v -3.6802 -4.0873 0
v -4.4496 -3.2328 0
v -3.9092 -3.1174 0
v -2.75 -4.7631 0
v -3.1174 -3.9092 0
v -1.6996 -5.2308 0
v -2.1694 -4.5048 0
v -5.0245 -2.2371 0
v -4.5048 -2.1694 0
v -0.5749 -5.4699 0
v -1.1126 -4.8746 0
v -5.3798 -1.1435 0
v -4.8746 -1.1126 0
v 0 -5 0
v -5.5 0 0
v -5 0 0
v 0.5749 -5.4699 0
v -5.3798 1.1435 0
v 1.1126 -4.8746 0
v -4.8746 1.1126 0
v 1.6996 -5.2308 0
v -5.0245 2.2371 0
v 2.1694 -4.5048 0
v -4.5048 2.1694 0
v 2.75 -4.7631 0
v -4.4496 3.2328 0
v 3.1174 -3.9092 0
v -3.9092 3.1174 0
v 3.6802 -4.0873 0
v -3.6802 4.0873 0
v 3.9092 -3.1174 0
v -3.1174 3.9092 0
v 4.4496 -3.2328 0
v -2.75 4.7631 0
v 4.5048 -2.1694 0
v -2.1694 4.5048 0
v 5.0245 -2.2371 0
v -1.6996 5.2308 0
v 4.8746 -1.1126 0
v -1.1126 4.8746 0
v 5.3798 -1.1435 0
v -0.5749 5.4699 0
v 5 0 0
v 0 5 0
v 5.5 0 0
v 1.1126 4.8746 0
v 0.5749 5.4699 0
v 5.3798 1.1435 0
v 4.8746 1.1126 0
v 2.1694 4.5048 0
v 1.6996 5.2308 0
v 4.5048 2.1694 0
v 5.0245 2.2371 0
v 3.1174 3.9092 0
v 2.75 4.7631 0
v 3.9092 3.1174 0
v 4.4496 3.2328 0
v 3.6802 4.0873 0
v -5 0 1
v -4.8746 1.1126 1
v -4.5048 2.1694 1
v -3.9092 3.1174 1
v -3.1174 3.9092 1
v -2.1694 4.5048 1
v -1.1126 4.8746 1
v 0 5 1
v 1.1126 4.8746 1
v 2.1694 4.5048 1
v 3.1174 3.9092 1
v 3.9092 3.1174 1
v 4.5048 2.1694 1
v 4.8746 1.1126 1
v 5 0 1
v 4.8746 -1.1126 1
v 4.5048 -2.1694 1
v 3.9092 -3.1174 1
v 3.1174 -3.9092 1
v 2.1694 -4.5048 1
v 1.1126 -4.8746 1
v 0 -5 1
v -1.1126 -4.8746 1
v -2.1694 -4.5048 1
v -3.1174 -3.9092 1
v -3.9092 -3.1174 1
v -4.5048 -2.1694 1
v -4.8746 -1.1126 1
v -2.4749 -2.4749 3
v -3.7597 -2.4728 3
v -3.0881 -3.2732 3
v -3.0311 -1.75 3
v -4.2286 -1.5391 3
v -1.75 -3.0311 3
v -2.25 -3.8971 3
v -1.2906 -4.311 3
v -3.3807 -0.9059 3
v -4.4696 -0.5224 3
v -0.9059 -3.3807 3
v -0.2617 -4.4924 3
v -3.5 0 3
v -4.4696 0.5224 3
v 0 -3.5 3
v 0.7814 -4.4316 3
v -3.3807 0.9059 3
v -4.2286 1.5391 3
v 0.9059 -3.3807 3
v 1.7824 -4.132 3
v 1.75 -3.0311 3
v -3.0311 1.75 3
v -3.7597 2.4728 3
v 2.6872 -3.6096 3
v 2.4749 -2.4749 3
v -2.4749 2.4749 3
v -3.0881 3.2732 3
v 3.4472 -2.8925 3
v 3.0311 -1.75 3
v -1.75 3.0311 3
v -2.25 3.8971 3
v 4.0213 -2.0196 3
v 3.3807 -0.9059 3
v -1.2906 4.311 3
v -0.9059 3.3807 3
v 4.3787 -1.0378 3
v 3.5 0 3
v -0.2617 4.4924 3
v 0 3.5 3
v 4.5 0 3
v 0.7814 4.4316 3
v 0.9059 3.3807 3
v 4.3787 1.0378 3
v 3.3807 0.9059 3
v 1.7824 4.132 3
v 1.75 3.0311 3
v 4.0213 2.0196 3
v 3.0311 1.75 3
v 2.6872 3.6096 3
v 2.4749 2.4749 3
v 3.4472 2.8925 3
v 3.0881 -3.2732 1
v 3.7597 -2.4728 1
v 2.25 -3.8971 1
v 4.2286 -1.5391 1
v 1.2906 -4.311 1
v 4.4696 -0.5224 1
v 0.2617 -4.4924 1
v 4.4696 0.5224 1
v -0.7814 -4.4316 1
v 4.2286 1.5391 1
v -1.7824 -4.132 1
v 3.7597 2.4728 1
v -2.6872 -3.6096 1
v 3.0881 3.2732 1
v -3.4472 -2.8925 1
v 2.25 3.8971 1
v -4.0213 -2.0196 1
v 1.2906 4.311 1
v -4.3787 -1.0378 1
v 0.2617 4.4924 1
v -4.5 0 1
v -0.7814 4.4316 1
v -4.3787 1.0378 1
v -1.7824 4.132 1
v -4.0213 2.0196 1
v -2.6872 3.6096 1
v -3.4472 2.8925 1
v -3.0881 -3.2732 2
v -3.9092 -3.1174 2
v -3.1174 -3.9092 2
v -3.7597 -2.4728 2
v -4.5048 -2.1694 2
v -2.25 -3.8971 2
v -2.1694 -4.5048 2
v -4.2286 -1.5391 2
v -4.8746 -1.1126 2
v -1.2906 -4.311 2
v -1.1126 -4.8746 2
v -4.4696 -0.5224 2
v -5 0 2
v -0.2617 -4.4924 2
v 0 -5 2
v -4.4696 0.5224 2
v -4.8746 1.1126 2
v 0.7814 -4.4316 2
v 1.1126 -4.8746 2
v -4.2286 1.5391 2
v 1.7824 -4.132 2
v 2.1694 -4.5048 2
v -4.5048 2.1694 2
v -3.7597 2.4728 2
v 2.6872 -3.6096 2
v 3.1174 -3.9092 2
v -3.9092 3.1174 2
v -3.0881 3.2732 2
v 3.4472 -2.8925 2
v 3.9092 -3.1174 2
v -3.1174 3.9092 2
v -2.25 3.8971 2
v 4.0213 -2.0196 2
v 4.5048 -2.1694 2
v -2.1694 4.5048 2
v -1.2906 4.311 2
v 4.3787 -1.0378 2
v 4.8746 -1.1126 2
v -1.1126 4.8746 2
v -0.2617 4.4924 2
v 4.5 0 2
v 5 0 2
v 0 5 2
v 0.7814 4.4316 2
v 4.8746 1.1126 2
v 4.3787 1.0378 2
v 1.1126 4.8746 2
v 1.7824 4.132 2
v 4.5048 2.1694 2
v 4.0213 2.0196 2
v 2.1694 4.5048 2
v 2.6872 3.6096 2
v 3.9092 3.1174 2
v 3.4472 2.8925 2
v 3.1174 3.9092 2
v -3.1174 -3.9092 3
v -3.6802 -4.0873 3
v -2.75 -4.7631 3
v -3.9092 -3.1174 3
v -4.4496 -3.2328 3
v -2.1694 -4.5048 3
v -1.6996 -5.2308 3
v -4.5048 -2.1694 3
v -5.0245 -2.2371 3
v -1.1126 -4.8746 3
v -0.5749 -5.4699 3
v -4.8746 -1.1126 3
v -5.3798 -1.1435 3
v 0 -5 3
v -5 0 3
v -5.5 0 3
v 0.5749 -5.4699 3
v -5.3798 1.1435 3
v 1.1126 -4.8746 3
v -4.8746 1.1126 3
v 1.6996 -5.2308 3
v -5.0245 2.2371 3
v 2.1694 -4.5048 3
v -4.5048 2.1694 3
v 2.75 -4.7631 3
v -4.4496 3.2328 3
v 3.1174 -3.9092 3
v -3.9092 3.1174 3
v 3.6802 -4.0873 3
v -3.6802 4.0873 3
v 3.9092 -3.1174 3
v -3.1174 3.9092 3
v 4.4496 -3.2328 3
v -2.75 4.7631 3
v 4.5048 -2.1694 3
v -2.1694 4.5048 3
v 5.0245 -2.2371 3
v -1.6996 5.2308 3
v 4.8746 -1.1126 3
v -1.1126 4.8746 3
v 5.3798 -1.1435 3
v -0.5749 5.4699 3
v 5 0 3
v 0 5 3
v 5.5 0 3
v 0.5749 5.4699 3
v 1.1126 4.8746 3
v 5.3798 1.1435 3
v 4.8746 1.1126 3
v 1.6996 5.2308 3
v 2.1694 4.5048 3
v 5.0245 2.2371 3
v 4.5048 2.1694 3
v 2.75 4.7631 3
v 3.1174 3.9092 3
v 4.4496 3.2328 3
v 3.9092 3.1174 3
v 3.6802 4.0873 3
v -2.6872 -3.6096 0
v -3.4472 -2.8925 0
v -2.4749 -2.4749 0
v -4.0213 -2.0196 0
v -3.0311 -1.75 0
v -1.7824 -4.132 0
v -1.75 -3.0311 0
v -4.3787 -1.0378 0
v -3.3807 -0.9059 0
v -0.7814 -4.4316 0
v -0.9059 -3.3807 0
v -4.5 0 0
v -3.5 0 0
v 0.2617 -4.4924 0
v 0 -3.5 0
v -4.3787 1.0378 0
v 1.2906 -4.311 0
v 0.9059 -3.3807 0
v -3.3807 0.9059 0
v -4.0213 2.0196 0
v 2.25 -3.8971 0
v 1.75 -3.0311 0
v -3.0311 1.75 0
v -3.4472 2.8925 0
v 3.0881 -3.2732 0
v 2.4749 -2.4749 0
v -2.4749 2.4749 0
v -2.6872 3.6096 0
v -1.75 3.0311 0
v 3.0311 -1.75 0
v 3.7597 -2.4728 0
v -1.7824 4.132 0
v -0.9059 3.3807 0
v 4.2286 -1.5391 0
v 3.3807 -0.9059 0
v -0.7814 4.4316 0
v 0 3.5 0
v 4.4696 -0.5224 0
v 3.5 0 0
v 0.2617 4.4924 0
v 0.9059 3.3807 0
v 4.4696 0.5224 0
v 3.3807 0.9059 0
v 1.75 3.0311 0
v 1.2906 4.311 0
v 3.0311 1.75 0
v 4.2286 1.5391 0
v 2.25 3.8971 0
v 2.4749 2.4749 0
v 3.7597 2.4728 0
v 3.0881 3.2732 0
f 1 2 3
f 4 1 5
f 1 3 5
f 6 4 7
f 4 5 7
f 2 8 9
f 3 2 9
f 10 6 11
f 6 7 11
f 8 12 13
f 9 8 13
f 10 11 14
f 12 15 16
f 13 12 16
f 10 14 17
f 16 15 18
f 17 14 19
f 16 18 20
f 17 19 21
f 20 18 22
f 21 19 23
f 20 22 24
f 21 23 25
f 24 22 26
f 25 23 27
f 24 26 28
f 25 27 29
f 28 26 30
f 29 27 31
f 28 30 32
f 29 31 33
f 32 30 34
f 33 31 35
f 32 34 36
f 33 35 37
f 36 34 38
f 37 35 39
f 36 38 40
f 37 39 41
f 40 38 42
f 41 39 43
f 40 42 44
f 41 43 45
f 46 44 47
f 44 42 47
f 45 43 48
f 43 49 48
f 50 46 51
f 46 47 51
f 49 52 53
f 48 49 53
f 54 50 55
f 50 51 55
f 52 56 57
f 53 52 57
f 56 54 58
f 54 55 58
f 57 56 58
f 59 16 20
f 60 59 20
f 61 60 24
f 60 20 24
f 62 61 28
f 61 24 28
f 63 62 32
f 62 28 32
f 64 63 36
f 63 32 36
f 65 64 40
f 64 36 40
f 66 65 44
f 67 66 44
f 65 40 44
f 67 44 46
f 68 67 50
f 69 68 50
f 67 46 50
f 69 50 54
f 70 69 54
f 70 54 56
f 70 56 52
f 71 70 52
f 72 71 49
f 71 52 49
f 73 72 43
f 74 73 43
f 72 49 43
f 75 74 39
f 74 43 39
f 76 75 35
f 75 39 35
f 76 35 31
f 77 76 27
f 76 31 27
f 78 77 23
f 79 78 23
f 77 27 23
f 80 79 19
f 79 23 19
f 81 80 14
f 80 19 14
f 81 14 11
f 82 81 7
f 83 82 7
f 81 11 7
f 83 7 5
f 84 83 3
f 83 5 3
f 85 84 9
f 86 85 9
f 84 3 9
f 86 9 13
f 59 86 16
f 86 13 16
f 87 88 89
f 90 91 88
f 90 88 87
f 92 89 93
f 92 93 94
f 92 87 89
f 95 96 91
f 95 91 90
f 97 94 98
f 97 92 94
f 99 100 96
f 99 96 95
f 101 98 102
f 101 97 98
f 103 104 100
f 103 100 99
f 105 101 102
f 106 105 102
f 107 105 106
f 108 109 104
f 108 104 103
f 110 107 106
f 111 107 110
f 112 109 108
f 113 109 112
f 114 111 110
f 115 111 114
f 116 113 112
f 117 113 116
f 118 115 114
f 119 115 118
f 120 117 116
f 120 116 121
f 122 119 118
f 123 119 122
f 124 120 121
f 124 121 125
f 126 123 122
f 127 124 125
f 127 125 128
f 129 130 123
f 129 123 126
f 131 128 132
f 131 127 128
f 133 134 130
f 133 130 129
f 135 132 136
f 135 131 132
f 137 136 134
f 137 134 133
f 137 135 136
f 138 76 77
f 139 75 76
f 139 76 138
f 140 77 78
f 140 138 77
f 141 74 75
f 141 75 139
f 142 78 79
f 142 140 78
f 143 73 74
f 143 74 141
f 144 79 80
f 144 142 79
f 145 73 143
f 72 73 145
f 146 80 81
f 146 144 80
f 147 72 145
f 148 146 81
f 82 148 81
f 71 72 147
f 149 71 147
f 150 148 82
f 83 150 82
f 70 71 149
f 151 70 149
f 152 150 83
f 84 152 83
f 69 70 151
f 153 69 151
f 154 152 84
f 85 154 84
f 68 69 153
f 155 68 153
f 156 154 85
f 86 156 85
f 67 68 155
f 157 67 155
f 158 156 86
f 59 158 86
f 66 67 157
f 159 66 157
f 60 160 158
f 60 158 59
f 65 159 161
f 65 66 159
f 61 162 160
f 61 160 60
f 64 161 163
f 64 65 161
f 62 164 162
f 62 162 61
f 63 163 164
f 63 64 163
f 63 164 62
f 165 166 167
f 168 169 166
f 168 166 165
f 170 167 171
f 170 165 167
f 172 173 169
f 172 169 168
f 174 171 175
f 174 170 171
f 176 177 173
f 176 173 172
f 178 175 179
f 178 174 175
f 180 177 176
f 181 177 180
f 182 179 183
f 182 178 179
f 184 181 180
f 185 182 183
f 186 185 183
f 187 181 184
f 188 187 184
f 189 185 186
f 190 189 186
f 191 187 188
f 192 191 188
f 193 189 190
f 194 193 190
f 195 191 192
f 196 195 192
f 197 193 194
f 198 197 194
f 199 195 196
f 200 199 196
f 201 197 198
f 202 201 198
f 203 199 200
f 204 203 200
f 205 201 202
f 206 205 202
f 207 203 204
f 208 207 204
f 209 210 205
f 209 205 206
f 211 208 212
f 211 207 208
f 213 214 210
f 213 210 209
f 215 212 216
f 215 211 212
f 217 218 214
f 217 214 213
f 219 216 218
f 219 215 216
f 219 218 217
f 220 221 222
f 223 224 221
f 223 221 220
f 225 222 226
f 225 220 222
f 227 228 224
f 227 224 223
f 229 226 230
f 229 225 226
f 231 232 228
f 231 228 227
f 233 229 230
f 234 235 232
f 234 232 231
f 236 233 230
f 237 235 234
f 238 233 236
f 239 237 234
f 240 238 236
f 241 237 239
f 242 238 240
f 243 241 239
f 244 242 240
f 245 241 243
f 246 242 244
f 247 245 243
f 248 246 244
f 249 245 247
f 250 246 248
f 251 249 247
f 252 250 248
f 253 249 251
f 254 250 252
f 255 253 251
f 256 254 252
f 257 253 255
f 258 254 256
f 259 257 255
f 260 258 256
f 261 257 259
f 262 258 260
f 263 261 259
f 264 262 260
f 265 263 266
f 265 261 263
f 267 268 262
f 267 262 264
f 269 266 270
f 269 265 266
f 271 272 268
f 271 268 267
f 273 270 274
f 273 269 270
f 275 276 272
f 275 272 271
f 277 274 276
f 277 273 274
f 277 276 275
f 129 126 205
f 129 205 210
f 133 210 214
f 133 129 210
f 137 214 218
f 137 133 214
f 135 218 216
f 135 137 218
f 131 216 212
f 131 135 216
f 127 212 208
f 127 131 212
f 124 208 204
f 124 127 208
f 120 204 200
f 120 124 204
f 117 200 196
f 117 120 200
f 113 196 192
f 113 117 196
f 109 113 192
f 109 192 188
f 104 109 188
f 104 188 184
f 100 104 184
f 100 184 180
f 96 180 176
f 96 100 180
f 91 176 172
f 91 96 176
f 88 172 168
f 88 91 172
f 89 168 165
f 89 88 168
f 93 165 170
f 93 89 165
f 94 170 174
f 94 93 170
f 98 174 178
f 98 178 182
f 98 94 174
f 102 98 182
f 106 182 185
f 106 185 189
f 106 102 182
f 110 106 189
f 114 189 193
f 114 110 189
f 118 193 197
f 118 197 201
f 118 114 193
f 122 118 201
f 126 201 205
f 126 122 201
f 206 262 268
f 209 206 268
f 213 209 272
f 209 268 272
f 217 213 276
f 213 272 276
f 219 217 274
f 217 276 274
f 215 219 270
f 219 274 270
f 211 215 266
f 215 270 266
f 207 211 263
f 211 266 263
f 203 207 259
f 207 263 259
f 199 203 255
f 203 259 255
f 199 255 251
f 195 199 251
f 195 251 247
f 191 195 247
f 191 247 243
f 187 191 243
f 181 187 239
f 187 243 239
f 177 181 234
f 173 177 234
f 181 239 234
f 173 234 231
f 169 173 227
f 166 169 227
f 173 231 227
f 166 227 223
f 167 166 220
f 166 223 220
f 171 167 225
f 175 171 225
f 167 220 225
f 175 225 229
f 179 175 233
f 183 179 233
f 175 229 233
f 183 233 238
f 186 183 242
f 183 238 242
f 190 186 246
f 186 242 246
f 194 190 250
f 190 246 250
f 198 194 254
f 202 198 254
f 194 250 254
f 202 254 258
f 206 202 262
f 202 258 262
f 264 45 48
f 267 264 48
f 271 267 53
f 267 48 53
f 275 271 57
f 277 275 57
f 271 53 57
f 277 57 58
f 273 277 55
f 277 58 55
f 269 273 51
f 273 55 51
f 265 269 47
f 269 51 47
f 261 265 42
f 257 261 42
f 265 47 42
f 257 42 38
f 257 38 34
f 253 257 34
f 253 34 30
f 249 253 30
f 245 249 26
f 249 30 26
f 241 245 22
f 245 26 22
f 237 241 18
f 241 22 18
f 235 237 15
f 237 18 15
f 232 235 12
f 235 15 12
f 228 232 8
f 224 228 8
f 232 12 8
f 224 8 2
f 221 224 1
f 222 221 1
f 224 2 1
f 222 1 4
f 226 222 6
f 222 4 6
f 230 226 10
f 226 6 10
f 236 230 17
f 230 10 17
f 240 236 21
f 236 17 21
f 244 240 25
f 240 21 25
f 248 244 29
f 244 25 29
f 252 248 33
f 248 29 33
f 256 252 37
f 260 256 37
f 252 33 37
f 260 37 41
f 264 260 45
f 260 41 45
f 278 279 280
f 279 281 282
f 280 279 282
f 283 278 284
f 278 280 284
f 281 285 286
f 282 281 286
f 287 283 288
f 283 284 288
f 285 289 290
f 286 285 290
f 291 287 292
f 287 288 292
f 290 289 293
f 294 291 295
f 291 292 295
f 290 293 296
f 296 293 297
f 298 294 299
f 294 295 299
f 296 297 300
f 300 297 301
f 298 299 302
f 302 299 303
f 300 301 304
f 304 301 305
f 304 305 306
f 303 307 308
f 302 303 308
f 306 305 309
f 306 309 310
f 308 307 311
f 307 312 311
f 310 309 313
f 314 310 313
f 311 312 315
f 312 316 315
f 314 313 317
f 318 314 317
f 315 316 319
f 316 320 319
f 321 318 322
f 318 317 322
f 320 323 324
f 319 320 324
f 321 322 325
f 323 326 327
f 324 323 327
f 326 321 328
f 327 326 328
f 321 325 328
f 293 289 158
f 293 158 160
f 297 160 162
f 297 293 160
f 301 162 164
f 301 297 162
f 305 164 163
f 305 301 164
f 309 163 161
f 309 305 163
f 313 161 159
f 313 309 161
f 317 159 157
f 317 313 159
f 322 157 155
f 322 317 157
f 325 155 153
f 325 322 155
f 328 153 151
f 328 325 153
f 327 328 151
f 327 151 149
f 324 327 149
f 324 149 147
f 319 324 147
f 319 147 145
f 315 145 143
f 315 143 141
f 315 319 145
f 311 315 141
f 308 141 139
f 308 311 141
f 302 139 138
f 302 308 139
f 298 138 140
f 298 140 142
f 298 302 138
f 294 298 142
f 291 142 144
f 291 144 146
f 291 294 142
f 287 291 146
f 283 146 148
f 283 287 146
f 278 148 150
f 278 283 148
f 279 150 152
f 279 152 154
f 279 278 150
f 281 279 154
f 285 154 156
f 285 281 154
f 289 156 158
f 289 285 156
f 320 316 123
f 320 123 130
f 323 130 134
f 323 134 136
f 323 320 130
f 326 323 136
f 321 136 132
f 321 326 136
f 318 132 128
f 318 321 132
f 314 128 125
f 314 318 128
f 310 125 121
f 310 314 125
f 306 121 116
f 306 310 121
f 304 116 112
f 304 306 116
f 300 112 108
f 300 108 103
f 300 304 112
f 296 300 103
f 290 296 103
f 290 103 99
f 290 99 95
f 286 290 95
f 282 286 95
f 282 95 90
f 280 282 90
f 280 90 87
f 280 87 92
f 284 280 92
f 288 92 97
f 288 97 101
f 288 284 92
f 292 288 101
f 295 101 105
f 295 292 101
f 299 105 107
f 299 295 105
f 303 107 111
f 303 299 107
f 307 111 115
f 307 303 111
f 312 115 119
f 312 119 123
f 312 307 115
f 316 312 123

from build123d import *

# Parameters (mm, degrees)
SKETCH_1_R          = 5.5
SKETCH_1_R_2        = 3.5
EXTRUDE_1_DEPTH     = 3
SKETCH_2_R          = 5
SKETCH_2_R_2        = 4.5
CUT_EXTRUDE_1_DEPTH = 1
SKETCH_3_R          = 5
SKETCH_3_R_2        = 4.5
CUT_EXTRUDE_2_DEPTH = 1


with BuildPart() as part:
    # 草图1 → 凸台-拉伸1 (new body)
    with BuildSketch(Plane.XY):
        Circle(SKETCH_1_R)
        Circle(SKETCH_1_R_2, mode=Mode.SUBTRACT)
    extrude(amount=EXTRUDE_1_DEPTH)

    # 草图2 → 切除-拉伸1 (cut)
    with BuildSketch(Plane.XY.offset(3)):
        Circle(SKETCH_2_R)
        Circle(SKETCH_2_R_2, mode=Mode.SUBTRACT)
    extrude(amount=-CUT_EXTRUDE_1_DEPTH, mode=Mode.SUBTRACT)

    # 草图3 → 切除-拉伸2 (cut)
    with BuildSketch(Plane(origin=(0, 0, 0), x_dir=(-1, 0, 0), z_dir=(0, 0, -1))):
        Circle(SKETCH_3_R)
        Circle(SKETCH_3_R_2, mode=Mode.SUBTRACT)
    extrude(amount=-CUT_EXTRUDE_2_DEPTH, mode=Mode.SUBTRACT)


solid = part.part
